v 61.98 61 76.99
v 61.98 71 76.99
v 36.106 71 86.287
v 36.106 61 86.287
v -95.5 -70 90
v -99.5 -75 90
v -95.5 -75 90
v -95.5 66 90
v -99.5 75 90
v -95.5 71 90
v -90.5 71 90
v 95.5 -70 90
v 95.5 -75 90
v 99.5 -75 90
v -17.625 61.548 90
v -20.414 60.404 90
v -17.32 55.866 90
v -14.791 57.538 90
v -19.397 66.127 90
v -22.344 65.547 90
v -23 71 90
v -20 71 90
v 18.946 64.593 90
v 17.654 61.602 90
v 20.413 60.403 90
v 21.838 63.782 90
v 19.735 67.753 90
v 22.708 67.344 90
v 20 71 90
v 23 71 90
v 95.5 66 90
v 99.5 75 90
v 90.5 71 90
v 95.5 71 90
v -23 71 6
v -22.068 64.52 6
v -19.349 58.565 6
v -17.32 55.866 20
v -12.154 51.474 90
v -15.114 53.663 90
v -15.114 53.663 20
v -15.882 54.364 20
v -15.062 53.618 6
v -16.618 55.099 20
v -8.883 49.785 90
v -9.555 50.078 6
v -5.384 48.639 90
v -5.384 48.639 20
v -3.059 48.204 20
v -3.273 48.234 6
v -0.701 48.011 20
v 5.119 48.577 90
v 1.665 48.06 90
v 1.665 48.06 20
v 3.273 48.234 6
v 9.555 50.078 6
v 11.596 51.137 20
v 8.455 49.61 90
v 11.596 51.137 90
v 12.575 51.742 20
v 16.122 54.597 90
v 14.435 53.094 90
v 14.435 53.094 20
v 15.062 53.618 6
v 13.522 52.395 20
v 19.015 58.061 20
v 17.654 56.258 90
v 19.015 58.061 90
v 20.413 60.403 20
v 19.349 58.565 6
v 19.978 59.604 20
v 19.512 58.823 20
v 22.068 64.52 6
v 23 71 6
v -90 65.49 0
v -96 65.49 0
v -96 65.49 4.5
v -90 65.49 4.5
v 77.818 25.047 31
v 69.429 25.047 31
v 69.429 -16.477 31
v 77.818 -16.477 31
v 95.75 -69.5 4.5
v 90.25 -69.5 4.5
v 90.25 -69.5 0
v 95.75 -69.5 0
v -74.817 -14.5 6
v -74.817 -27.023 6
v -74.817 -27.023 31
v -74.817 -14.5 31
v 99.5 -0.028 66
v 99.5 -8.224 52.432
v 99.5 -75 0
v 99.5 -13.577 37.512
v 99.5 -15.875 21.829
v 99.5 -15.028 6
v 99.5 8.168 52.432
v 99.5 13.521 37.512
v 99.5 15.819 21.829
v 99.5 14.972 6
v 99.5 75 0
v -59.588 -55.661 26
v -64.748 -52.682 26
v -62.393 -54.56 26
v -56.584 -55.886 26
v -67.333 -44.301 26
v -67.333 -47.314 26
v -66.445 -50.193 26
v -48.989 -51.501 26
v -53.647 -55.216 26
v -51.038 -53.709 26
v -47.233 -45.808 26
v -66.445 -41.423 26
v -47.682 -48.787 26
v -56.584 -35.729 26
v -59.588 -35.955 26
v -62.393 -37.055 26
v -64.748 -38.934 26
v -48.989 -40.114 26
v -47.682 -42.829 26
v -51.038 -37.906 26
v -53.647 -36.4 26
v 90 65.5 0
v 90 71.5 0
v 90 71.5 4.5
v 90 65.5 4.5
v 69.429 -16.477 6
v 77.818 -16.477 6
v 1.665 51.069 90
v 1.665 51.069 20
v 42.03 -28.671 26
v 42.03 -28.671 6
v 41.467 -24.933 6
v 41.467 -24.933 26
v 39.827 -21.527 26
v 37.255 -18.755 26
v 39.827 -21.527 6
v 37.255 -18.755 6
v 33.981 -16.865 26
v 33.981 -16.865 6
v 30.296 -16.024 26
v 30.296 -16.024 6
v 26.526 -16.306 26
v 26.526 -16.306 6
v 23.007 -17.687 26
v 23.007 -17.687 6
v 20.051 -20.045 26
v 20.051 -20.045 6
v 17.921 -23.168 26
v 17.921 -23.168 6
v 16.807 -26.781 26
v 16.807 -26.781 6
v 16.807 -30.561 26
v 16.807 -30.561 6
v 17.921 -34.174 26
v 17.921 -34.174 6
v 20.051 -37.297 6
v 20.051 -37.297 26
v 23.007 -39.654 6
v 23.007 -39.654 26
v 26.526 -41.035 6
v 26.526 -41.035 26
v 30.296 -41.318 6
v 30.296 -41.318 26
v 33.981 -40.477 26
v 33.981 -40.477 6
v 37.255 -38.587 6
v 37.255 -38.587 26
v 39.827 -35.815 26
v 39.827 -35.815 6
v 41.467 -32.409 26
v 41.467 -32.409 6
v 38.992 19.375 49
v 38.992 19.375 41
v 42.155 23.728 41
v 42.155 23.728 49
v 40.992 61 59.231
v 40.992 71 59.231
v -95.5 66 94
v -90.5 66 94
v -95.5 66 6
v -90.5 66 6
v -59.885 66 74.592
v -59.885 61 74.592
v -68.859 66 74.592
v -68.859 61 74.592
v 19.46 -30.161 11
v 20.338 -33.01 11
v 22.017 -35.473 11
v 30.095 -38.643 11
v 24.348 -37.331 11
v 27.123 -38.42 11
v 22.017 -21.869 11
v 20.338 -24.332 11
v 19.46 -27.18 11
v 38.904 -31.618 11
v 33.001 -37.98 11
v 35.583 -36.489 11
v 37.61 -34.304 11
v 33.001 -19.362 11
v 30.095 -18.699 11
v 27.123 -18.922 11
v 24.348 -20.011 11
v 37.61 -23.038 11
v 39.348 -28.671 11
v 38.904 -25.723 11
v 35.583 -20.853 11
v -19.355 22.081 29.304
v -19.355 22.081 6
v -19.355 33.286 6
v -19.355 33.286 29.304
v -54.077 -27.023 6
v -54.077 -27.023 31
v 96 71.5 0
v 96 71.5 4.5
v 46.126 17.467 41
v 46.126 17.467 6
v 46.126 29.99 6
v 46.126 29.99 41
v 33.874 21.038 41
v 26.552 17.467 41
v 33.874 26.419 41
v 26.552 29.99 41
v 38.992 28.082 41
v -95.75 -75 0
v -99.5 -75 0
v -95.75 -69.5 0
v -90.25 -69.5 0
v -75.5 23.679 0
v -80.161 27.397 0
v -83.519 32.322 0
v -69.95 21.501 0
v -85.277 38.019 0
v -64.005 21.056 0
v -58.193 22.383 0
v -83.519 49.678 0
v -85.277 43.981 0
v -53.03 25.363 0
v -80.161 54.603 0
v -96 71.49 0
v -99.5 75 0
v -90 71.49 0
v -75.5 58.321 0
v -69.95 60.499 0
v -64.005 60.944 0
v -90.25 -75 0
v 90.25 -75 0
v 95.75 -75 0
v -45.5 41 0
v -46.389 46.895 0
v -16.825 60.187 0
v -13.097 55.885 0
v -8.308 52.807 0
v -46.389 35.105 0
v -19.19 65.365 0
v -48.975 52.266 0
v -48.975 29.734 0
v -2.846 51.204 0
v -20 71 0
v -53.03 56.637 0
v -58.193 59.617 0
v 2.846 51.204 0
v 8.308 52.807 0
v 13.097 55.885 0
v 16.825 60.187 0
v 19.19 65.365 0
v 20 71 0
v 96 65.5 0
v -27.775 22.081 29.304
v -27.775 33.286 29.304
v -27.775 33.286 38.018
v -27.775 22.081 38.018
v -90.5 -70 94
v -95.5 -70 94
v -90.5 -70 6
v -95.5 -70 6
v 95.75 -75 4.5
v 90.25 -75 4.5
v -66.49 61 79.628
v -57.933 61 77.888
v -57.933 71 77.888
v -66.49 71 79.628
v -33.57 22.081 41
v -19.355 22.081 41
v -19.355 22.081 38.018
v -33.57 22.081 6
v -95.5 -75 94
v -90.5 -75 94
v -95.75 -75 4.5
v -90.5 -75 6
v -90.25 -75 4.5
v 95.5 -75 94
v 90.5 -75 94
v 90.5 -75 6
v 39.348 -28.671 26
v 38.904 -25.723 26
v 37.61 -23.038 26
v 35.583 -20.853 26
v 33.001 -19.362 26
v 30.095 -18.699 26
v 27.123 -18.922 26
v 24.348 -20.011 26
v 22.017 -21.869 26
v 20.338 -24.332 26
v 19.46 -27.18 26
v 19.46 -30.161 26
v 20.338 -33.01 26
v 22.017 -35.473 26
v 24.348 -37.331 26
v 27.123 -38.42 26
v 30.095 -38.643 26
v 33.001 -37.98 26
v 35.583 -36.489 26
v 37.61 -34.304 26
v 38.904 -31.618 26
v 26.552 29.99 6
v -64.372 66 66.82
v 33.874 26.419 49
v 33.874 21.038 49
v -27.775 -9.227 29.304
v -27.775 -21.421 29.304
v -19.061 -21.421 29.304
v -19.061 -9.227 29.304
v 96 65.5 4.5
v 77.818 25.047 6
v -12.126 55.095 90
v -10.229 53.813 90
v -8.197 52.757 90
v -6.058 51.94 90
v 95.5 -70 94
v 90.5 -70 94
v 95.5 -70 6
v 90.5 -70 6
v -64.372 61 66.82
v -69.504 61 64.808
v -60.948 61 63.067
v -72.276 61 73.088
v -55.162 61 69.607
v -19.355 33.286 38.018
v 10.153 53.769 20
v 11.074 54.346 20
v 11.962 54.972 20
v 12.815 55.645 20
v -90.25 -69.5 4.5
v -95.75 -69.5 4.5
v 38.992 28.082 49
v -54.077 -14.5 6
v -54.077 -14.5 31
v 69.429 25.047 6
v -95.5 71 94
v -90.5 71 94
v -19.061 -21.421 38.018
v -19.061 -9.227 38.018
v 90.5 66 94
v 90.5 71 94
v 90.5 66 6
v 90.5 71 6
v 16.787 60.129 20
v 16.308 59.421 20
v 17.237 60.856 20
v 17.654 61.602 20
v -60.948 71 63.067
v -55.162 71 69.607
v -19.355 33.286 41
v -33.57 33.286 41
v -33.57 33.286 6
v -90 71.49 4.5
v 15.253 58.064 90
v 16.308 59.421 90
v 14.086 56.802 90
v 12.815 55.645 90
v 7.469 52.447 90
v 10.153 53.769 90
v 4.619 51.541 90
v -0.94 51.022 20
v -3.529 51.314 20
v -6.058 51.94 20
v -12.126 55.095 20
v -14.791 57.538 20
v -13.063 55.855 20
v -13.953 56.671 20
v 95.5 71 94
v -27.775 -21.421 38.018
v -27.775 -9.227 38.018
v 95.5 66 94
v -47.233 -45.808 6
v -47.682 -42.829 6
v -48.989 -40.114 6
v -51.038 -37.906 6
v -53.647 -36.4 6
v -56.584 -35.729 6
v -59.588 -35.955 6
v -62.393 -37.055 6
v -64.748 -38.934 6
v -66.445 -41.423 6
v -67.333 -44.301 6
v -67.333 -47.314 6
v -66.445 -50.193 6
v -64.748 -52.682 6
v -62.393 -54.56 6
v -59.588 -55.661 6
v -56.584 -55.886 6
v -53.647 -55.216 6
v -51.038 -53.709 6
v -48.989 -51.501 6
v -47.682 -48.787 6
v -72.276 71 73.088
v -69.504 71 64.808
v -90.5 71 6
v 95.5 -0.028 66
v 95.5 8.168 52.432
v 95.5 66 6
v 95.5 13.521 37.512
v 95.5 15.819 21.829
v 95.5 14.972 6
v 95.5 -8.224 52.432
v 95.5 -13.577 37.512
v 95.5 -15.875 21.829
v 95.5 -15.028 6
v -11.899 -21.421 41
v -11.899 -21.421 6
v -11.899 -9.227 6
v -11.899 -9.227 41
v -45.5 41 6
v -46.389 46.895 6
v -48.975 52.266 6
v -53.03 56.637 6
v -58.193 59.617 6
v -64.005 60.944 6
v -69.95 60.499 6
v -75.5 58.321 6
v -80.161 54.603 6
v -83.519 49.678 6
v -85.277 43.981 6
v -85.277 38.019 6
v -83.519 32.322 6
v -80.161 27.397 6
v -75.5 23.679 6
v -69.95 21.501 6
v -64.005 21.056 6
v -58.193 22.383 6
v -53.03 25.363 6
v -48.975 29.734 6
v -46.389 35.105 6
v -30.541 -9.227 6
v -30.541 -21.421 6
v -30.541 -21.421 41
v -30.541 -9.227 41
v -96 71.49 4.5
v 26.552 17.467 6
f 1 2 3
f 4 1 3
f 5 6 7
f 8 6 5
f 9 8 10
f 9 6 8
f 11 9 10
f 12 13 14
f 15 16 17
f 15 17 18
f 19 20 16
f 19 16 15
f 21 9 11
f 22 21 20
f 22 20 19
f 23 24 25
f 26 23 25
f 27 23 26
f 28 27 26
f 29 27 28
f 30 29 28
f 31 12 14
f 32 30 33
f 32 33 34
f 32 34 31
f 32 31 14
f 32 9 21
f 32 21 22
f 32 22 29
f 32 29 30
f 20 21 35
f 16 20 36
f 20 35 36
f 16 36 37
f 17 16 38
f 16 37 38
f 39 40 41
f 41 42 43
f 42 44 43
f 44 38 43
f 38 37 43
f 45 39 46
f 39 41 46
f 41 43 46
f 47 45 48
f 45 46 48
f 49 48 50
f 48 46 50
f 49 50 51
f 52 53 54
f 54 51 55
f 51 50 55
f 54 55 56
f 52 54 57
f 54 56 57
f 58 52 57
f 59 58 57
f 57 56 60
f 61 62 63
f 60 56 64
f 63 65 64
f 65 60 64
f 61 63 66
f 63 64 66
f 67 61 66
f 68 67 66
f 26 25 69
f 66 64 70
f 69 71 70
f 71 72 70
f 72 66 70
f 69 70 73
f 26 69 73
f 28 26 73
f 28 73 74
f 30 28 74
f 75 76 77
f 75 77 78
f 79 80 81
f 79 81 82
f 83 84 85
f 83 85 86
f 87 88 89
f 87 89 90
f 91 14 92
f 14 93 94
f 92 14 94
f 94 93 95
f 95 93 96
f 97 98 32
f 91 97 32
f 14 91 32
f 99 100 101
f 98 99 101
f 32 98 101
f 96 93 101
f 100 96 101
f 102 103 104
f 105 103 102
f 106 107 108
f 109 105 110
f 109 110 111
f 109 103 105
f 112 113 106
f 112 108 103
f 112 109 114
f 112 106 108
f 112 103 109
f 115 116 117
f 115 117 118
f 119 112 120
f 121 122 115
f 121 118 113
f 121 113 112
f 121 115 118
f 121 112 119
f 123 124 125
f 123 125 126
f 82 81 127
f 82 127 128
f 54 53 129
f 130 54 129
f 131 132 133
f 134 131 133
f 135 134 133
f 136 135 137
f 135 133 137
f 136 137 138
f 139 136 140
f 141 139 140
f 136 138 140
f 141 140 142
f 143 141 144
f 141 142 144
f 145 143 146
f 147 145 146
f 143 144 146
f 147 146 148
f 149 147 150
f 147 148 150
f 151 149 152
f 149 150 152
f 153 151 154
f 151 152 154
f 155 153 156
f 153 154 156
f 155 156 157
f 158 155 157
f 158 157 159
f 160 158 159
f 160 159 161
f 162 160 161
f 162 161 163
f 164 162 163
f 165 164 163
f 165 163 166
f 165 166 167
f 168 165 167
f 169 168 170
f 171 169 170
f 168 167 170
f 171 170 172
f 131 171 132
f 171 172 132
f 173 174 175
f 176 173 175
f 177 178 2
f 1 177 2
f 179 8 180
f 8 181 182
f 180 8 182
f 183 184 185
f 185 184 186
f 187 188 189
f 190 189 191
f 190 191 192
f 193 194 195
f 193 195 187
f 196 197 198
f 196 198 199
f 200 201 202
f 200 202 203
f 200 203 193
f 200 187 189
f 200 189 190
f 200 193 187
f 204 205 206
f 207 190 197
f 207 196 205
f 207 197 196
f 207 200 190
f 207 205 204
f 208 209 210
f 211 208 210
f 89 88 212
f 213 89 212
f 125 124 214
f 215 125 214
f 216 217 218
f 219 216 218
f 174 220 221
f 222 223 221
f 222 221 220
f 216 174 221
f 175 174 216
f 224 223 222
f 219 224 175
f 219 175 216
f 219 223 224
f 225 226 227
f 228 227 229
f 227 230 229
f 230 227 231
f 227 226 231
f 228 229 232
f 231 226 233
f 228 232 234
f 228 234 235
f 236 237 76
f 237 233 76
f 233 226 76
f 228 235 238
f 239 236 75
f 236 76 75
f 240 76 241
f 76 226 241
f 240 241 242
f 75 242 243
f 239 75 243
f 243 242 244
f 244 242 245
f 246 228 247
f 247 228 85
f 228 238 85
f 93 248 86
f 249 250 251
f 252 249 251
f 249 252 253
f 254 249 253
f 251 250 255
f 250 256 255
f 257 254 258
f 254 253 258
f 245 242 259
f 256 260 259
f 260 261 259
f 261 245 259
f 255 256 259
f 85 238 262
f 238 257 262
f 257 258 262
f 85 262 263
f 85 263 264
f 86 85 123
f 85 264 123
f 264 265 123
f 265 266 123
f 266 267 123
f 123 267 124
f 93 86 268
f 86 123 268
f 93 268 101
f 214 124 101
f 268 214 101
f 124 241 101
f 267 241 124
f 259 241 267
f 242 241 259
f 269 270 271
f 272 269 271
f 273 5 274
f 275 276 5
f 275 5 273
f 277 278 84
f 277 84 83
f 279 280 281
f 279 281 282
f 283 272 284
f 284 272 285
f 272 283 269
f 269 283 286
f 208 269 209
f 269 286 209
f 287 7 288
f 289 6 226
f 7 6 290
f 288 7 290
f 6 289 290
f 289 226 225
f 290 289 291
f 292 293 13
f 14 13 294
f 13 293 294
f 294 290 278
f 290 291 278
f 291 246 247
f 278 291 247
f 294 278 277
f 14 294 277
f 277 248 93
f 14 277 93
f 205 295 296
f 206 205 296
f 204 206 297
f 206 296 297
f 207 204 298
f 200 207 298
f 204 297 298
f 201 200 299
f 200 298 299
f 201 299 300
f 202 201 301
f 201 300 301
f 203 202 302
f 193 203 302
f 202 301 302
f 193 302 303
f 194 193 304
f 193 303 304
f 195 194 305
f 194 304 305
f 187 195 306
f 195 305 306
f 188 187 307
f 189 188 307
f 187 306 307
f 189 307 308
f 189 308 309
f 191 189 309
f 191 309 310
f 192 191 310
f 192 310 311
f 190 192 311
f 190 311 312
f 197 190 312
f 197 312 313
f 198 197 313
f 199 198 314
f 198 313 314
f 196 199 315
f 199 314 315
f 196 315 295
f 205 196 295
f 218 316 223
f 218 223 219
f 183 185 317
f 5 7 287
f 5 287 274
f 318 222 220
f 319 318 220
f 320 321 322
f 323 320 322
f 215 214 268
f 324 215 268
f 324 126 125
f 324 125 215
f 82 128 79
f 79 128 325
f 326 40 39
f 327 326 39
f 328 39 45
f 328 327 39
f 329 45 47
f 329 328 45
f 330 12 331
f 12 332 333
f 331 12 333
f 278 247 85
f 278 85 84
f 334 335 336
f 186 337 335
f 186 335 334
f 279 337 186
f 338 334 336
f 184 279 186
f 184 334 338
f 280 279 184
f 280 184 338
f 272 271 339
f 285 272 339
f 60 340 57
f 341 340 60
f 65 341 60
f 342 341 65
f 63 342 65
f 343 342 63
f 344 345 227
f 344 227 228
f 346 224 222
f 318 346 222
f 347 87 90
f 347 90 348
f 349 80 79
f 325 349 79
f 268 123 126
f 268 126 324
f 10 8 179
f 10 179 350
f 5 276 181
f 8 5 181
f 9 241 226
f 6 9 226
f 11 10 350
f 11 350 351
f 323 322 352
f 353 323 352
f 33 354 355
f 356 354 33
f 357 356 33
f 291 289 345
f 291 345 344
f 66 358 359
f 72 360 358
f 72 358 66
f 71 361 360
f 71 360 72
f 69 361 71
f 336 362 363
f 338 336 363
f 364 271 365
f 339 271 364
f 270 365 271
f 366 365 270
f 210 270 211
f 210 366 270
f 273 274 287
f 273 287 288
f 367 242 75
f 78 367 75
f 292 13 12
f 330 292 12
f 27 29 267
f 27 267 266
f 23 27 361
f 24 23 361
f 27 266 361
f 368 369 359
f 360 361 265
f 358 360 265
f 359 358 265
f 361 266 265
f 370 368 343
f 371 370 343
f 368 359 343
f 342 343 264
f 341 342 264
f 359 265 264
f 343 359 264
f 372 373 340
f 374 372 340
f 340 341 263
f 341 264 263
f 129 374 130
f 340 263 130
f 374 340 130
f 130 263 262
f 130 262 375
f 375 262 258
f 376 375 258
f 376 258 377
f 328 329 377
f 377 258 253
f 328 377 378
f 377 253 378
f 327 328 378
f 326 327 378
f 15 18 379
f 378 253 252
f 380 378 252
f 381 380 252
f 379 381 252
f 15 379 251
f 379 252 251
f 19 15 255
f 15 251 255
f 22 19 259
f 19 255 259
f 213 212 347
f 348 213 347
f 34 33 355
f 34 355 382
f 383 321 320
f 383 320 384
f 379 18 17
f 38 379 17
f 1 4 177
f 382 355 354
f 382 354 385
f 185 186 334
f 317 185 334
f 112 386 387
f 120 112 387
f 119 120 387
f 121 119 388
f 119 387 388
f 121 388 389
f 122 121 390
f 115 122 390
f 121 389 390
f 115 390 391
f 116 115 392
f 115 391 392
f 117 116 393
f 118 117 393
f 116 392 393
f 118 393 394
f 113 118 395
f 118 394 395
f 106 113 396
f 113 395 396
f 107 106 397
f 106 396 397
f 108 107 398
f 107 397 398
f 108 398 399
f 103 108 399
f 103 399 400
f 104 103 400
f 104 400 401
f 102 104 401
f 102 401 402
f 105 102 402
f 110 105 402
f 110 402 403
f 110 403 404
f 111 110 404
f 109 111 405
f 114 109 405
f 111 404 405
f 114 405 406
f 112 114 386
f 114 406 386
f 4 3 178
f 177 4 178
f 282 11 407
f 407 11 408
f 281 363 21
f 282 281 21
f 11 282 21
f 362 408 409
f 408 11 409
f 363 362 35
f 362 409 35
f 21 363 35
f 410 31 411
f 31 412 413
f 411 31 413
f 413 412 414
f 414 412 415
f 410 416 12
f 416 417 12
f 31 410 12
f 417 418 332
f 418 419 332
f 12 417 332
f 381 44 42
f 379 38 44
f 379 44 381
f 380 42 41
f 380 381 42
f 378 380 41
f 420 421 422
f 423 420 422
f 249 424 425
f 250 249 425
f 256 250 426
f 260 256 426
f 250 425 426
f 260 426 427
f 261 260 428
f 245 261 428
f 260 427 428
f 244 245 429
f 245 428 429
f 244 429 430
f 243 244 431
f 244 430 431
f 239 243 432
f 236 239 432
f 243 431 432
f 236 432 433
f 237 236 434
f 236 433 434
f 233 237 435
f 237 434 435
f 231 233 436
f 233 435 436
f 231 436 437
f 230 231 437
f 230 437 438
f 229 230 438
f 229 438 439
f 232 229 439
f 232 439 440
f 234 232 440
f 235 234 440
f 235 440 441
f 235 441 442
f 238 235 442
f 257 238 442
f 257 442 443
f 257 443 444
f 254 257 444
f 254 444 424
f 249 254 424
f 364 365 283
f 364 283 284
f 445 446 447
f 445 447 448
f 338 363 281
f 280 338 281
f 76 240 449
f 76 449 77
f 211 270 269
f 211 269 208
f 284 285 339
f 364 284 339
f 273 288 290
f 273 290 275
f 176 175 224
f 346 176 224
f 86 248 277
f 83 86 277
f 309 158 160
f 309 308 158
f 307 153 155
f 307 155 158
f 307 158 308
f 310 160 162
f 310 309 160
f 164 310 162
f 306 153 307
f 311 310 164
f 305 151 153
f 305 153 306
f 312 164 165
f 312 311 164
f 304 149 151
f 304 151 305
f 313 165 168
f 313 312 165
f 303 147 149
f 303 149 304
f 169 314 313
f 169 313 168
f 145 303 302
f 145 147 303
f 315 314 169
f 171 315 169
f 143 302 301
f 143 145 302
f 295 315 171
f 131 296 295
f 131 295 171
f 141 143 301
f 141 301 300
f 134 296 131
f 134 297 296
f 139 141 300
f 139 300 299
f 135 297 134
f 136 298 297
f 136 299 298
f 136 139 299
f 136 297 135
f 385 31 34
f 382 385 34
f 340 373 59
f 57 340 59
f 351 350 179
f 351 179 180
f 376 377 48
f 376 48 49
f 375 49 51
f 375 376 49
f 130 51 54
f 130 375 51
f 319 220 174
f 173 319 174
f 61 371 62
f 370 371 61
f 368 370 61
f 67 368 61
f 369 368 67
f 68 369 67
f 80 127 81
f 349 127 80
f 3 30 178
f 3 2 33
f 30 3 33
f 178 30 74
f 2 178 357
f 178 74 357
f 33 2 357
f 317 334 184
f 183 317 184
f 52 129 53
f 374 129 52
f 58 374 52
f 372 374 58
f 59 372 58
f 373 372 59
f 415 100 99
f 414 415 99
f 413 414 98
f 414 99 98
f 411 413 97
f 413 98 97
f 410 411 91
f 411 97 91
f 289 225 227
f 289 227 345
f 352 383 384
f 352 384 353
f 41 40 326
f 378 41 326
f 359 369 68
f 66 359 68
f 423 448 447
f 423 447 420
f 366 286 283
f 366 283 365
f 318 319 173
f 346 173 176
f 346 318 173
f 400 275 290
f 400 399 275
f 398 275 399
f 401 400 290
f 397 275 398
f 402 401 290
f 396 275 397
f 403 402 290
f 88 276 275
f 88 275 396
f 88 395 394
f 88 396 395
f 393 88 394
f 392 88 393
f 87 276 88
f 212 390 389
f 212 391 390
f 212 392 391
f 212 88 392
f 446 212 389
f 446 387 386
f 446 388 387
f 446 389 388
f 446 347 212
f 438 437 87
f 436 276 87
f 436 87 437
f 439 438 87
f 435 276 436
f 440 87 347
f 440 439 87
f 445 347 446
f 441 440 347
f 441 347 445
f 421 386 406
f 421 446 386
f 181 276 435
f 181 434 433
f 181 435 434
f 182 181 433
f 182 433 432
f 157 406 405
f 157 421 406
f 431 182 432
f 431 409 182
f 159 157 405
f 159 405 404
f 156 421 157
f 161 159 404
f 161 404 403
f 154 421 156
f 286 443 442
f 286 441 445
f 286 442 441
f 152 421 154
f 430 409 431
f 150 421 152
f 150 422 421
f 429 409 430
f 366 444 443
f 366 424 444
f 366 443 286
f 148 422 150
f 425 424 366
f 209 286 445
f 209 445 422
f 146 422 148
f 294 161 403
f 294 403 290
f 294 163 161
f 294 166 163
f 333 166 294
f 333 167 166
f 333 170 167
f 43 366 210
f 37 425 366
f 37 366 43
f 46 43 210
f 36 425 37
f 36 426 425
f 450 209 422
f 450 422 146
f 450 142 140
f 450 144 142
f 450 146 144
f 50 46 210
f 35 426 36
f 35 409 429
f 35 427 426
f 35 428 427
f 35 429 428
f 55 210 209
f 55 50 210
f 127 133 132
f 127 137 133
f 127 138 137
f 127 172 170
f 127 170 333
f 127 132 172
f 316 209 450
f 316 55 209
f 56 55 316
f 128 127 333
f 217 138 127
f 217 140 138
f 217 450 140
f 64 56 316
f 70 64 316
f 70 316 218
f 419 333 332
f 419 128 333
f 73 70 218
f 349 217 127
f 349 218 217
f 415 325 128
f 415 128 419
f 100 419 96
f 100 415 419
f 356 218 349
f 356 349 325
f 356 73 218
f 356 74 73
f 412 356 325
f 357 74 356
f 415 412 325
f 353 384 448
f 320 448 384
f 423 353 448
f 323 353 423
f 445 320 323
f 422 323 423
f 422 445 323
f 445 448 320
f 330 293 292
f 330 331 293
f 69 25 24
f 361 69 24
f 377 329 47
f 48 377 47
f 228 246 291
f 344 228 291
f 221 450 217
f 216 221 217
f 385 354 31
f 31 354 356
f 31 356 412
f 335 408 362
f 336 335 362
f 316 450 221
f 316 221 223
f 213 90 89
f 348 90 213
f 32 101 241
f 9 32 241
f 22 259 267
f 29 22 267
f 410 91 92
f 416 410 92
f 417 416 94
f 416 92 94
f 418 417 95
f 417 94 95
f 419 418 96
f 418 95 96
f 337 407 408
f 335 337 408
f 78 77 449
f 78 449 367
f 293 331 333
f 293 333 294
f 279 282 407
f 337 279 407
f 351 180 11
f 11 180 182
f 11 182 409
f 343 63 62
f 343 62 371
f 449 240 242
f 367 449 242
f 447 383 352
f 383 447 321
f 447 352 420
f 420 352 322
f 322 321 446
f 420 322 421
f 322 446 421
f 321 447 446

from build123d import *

# Parameters (mm, degrees)
F1_DEPTH  = 6
F2_DEPTH  = 90
F0_W      = 5
F0_H      = 5
F3_DEPTH  = 94
F4_W      = 5.5
F4_H      = 4.5
F5_DEPTH  = 5.5
F6_DEPTH  = 5.5
F7_R      = 20
F8_DEPTH  = 7
F9_DEPTH  = 6
F10_DEPTH = 84
F12_DEPTH = 4
F13_DEPTH = 5.5
F14_DEPTH = 25
F15_W     = 6
F15_H     = 6
F16_DEPTH = 4.5
F17_W     = 6
F17_H     = 6
F18_DEPTH = 4.5
F19_W     = 20.739749
F19_H     = 12.523103
F19_W_2   = 8.389108
F19_H_2   = 41.523981
F20_DEPTH = 25
F19_W_3   = 14.214885
F19_H_3   = 11.204887
F19_W_4   = 18.642471
F19_H_4   = 12.193553
F19_W_5   = 19.574596
F19_H_5   = 12.523113
F21_DEPTH = 35
F22_R     = 12.682536
F22_R_2   = 10.10667
F23_DEPTH = 20
F25_DEPTH = 10
F26_R     = 10
F27_DEPTH = 15
F28_W     = 8.713692
F28_H     = 8.713695
F29_DEPTH = 55
F31_DEPTH = 10
F33_DEPTH = 8
F35_DEPTH = 5
F37_DEPTH = 70


with BuildPart() as f1:
    # F0 (on Top) → F1 (new body)
    with BuildSketch(Plane.XY):
        Polygon((-90.5, -70), (-90.5, -75), (90.5, -75), (90.5, -70), (95.5, -70), (95.5, -66), (95.5, 66), (90.5, 66), (90.5, 71), (-90.5, 71), (-90.5, 66), (-95.5, 66), (-95.5, -66), (-95.5, -70), align=None)
        Polygon((99.5, 75), (-99.5, 75), (-99.5, -75), (-95.5, -75), (-95.5, -70), (-95.5, -66), (-95.5, 66), (-95.5, 71), (-90.5, 71), (90.5, 71), (95.5, 71), (95.5, 66), (95.5, -66), (95.5, -70), (95.5, -71), (95.5, -75), (99.5, -75), align=None)
    extrude(amount=F1_DEPTH)

    # F0 (on Top) → F2 (join)
    with BuildSketch(Plane.XY):
        Polygon((99.5, 75), (-99.5, 75), (-99.5, -75), (-95.5, -75), (-95.5, -70), (-95.5, -66), (-95.5, 66), (-95.5, 71), (-90.5, 71), (90.5, 71), (95.5, 71), (95.5, 66), (95.5, -66), (95.5, -70), (95.5, -71), (95.5, -75), (99.5, -75), align=None)
    extrude(amount=F2_DEPTH)

    # F0 (on Top) → F3 (join)
    with BuildSketch(Plane.XY):
        with Locations((-93, 68.5)):
            Rectangle(F0_W, F0_H)
        with Locations((93, 68.5)):
            Rectangle(F0_W, F0_H)
        Polygon((90.5, -75), (95.5, -75), (95.5, -71), (95.5, -70), (90.5, -70), align=None)
        with Locations((-93, -72.5)):
            Rectangle(F0_W, F0_H)
    extrude(amount=F3_DEPTH)

    # F4 (on face) → F5 (cut)
    with BuildSketch(Plane.XZ.offset(75)):
        with Locations((93, 2.25)):
            Rectangle(F4_W, F4_H)
    extrude(amount=-F5_DEPTH, mode=Mode.SUBTRACT)

    # F4 (on face) → F6 (cut)
    with BuildSketch(Plane.XZ.offset(75)):
        with Locations((-93, 2.25)):
            Rectangle(F4_W, F4_H)
    extrude(amount=F6_DEPTH, mode=Mode.SUBTRACT)

    # F7 (on face) → F8 (cut)
    with BuildSketch(Plane.XY.offset(6)):
        with Locations((-65.5, 41)):
            Circle(F7_R)
    extrude(amount=-F8_DEPTH, mode=Mode.SUBTRACT)

    # F7 (on face) → F9 (cut)
    with BuildSketch(Plane.XY.offset(6)):
        with BuildLine():
            Line((20, 71), (-20, 71))
            ThreePointArc((-20, 71), (0, 51), (20, 71))
        make_face()
    extrude(amount=-F9_DEPTH, mode=Mode.SUBTRACT)

    # F7 (on face) → F10 (join)
    with BuildSketch(Plane.XY.offset(6)):
        with BuildLine():
            Line((-20, 71), (-23, 71))
            ThreePointArc((-23, 71), (0, 48), (23, 71))
            Line((23, 71), (20, 71))
            ThreePointArc((20, 71), (0, 51), (-20, 71))
        make_face()
    extrude(amount=F10_DEPTH)

    # F11 (on face) → F12 (cut)
    with BuildSketch(Plane.YZ.offset(99.5)):
        with BuildLine():
            Line((-15.02791, 6), (14.97209, 6))
            ThreePointArc((14.97209, 6), (13.520819, 37.512182), (-0.02791, 66))
            ThreePointArc((-0.02791, 66), (-13.576638, 37.512182), (-15.02791, 6))
        make_face()
    extrude(amount=-F12_DEPTH, mode=Mode.SUBTRACT)

    # F4 (on face) → F13 (cut)
    with BuildSketch(Plane.XZ.offset(75)):
        with Locations((-93, 2.25)):
            Rectangle(F4_W, F4_H)
    extrude(amount=-F13_DEPTH, mode=Mode.SUBTRACT)

    # F0 (on Top) → F14 (join)
    with BuildSketch(Plane.XY):
        with Locations((-93, 68.5)):
            Rectangle(F0_W, F0_H)
    extrude(amount=F14_DEPTH)

    # F15 (on face) → F16 (cut)
    with BuildSketch(Plane(origin=(0, 0, 0), x_dir=(1, 0, 0), z_dir=(0, 0, -1))):
        with Locations((-93, -68.489519)):
            Rectangle(F15_W, F15_H)
    extrude(amount=-F16_DEPTH, mode=Mode.SUBTRACT)

    # F17 (on face) → F18 (cut)
    with BuildSketch(Plane(origin=(0, 0, 0), x_dir=(1, 0, 0), z_dir=(0, 0, -1))):
        with Locations((93, -68.5)):
            Rectangle(F17_W, F17_H)
    extrude(amount=-F18_DEPTH, mode=Mode.SUBTRACT)

    # F19 (on face) → F20 (join)
    with BuildSketch(Plane.XY.offset(6)):
        with Locations((-64.446979, -20.761568)):
            Rectangle(F19_W, F19_H)
        with Locations((73.623832, 4.284644)):
            Rectangle(F19_W_2, F19_H_2)
    extrude(amount=F20_DEPTH)

    # F19 (on face) → F21 (join)
    with BuildSketch(Plane.XY.offset(6)):
        with Locations((-26.462941, 27.683088)):
            Rectangle(F19_W_3, F19_H_3)
        with Locations((-21.219746, -15.323903)):
            Rectangle(F19_W_4, F19_H_4)
        with Locations((36.338889, 23.728418)):
            Rectangle(F19_W_5, F19_H_5)
    extrude(amount=F21_DEPTH)

    # F22 (on face) → F23 (join)
    with BuildSketch(Plane.XY.offset(6)):
        with Locations((29.347964, -28.670896)):
            Circle(F22_R)
        with Locations((-57.339538, -45.807783)):
            Circle(F22_R_2)
    extrude(amount=F23_DEPTH)

    # F24 (on face) → F25 (join)
    with BuildSketch(Plane.XZ.offset(-71)):
        Polygon((40.991751, 59.230904), (61.980041, 76.990236), (36.105864, 86.286962), align=None)
    extrude(amount=F25_DEPTH)

    # F26 (on face) → F27 (cut)
    with BuildSketch(Plane.XY.offset(26)):
        with Locations((29.347964, -28.670896)):
            Circle(F26_R)
    extrude(amount=-F27_DEPTH, mode=Mode.SUBTRACT)

    # F28 (on face) → F29 (cut)
    with BuildSketch(Plane.XZ.offset(21.42068)):
        with Locations((-23.41805, 33.660973)):
            Rectangle(F28_W, F28_H)
    extrude(amount=-F29_DEPTH, mode=Mode.SUBTRACT)

    # F30 (on face) → F31 (join)
    with BuildSketch(Plane.XZ.offset(-71)):
        Polygon((-60.947721, 63.067267), (-55.162239, 69.607382), (-57.933404, 77.887813), (-66.49005, 79.62813), (-72.275531, 73.088015), (-69.504367, 64.807584), align=None)
    extrude(amount=F31_DEPTH)

    # F32 (on face) → F33 (join)
    with BuildSketch(Plane.XY.offset(41)):
        Polygon((33.874482, 26.419034), (33.874482, 21.037802), (38.992337, 19.374911), (42.155346, 23.728418), (38.992337, 28.081926), align=None)
    extrude(amount=F33_DEPTH)

    # F34 (on face) → F35 (cut)
    with BuildSketch(Plane.XZ.offset(-61)):
        Polygon((-59.885368, 74.591823), (-68.859458, 74.591823), (-64.372413, 66.820033), align=None)
    extrude(amount=-F35_DEPTH, mode=Mode.SUBTRACT)

    # F36 (on face) → F37 (cut)
    with BuildSketch(Plane.XY.offset(90)):
        Polygon((1.664777, 54.871559), (-6.499225, 54.10137), (-4.958848, 46.553519), (1.664777, 46.553519), align=None)
        Polygon((11.985309, 56.951068), (9.674743, 54.640502), (12.293384, 49.865328), (15.402977, 51.570587), align=None)
        Polygon((-10.504208, 55.872802), (-13.81602, 58.183368), (-18.591192, 55.025596), (-16.126588, 53.177141), align=None)
        Polygon((16.837498, 61.957296), (16.307571, 59.421436), (20.30335, 57.413179), (21.556129, 59.905803), align=None)
    extrude(amount=-F37_DEPTH, mode=Mode.SUBTRACT)


solid = f1.part
